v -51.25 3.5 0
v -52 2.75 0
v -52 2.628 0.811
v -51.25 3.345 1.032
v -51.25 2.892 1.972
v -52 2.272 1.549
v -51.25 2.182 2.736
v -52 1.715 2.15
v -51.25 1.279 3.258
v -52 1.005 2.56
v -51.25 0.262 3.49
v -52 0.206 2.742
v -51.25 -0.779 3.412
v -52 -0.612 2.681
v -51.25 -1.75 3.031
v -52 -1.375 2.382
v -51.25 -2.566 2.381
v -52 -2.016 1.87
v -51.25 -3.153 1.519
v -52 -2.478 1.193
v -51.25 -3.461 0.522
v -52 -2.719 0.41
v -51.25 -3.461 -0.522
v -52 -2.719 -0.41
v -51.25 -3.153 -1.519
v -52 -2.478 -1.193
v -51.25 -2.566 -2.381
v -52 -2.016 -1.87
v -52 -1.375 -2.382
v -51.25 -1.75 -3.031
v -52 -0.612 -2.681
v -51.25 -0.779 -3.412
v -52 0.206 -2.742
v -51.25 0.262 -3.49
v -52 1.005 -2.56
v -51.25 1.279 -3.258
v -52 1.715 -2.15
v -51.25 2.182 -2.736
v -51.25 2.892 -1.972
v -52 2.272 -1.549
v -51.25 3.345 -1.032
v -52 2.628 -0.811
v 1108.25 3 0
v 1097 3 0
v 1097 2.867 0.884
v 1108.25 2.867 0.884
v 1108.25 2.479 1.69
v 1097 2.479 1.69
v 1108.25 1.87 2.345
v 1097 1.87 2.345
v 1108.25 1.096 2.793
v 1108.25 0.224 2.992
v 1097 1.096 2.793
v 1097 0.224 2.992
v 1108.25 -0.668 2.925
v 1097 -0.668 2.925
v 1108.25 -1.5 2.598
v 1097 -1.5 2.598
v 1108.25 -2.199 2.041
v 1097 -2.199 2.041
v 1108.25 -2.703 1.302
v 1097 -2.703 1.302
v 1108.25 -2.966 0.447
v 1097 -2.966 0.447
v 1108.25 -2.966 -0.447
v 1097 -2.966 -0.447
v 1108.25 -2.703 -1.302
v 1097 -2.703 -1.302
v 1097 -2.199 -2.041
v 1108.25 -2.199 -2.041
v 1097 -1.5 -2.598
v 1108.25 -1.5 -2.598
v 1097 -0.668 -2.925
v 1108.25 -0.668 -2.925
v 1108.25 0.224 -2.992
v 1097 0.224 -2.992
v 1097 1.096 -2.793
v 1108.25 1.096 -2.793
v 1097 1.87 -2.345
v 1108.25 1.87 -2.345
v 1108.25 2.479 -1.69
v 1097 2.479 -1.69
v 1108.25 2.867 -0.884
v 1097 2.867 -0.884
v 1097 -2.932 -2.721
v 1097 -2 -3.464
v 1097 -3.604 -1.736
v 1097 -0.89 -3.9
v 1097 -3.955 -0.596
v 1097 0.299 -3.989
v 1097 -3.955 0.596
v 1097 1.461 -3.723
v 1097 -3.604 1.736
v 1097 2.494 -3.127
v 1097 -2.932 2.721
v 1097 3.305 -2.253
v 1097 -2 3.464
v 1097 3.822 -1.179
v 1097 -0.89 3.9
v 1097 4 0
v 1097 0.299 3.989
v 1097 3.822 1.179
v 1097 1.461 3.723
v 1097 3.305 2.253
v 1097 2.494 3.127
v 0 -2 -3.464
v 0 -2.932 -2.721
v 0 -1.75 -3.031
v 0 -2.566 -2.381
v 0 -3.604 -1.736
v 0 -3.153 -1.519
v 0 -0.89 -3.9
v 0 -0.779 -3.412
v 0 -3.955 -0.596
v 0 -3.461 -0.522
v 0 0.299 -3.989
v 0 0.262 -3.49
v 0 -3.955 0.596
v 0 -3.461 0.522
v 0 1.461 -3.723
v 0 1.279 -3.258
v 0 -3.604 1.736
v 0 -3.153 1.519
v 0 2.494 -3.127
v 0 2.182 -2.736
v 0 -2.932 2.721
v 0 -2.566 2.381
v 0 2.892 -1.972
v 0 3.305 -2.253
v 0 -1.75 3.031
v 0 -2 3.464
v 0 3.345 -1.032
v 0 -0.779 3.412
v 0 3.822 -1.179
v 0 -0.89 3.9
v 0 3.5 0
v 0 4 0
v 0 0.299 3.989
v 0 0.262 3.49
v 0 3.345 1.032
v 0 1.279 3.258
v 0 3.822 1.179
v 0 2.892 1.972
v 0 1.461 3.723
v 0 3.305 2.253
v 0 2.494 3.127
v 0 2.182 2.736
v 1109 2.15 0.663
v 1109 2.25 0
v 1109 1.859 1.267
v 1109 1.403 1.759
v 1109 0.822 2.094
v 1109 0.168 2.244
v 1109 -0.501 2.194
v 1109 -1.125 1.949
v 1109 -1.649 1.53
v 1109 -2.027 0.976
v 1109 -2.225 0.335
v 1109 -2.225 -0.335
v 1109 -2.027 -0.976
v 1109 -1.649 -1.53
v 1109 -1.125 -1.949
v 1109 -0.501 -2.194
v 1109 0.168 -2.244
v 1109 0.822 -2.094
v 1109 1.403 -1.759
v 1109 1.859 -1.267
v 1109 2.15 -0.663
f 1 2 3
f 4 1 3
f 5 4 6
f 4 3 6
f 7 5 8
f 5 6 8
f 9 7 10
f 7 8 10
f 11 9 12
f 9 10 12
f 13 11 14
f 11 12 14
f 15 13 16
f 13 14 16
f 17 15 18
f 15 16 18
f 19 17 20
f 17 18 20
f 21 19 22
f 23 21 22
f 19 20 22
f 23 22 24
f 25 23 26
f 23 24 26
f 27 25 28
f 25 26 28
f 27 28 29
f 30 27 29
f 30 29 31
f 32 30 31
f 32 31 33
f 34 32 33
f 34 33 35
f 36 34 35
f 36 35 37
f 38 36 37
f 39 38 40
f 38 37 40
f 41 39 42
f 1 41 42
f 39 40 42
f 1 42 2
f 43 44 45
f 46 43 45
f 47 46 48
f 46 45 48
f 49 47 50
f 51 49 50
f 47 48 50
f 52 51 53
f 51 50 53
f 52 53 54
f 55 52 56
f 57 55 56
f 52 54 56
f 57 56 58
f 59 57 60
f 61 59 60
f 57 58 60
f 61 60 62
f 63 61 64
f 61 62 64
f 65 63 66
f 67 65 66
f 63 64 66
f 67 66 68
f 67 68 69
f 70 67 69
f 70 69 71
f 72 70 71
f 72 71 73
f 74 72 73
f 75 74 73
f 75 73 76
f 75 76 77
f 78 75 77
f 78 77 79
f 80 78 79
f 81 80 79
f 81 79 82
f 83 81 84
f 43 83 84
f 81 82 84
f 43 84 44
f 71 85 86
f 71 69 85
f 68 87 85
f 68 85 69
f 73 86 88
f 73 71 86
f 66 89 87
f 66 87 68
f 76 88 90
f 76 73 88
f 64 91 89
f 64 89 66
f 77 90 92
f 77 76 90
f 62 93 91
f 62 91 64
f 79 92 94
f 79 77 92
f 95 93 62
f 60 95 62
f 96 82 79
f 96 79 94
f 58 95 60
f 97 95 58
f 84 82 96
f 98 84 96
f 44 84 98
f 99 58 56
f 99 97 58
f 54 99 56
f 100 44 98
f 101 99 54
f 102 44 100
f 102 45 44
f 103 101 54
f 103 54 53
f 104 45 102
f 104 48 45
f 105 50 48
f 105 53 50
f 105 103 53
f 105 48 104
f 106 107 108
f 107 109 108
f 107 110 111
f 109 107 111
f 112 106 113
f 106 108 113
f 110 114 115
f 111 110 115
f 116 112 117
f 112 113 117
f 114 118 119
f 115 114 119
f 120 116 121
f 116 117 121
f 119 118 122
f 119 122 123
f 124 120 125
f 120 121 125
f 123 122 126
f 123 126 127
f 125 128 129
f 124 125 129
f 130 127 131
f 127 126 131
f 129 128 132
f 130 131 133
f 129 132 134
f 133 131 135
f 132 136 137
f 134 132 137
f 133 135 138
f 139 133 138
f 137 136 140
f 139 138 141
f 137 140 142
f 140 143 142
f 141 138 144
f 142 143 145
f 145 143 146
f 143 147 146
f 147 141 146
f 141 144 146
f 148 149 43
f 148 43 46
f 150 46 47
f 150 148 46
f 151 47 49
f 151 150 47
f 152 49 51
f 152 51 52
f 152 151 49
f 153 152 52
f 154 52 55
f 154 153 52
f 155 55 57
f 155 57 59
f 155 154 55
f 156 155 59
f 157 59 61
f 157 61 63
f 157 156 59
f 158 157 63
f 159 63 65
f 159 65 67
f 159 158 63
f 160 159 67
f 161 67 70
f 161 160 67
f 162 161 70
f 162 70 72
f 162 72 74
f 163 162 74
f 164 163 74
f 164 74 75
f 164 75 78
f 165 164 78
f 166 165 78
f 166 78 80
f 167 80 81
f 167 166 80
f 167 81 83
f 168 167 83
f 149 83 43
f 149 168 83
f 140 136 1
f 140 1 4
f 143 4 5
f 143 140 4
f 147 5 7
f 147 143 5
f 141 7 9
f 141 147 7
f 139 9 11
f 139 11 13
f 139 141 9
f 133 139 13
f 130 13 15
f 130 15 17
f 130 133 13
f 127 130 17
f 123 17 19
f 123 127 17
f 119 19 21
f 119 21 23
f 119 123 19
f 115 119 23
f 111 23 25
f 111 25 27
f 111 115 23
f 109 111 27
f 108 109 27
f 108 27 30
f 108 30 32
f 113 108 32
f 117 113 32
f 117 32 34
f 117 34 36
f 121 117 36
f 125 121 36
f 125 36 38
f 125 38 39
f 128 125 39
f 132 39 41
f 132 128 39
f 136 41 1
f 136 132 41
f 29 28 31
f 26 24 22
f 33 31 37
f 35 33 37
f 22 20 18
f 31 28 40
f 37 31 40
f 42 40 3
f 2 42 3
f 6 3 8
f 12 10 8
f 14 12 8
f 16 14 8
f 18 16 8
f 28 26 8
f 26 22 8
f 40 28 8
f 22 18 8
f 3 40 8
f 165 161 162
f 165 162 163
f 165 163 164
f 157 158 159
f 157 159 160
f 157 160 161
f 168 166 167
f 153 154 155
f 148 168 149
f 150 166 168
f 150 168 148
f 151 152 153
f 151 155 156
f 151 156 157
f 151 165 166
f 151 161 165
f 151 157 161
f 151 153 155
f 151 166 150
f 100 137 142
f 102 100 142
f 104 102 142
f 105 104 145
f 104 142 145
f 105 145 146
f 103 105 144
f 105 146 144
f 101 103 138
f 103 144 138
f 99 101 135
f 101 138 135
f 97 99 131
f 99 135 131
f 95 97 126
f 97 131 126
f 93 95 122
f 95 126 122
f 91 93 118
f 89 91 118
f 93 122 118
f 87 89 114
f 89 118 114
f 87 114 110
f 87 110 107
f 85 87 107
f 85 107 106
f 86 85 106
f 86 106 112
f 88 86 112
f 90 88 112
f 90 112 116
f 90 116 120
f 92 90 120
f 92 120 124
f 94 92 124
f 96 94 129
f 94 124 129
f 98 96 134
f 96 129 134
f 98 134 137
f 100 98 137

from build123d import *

# Parameters (mm, degrees)
F0_R     = 4
F1_DEPTH = 1097
F2_R     = 3.5
F3_DEPTH = 52
F4_R     = 3
F5_DEPTH = 12
F6_SIZE  = 0.75
F7_SIZE  = 0.75


with BuildPart() as f1:
    # F0 (on Right) → F1 (new body)
    with BuildSketch(Plane.YZ):
        Circle(F0_R)
    extrude(amount=F1_DEPTH)

    # F2 (on Right) → F3 (join)
    with BuildSketch(Plane.YZ):
        Circle(F2_R)
    extrude(amount=-F3_DEPTH)

    # F4 (on face) → F5 (join)
    with BuildSketch(Plane.YZ.offset(1097)):
        Circle(F4_R)
    extrude(amount=F5_DEPTH)

    # F6
    f6_edges = [f1.edges().sort_by_distance(p)[0] for p in [
        (1109, -3, 0),
    ]]
    chamfer(f6_edges, length=F6_SIZE)

    # F7
    f7_edges = [f1.edges().sort_by_distance(p)[0] for p in [
        (-52, -3.5, 0),
    ]]
    chamfer(f7_edges, length=F7_SIZE)


solid = f1.part
